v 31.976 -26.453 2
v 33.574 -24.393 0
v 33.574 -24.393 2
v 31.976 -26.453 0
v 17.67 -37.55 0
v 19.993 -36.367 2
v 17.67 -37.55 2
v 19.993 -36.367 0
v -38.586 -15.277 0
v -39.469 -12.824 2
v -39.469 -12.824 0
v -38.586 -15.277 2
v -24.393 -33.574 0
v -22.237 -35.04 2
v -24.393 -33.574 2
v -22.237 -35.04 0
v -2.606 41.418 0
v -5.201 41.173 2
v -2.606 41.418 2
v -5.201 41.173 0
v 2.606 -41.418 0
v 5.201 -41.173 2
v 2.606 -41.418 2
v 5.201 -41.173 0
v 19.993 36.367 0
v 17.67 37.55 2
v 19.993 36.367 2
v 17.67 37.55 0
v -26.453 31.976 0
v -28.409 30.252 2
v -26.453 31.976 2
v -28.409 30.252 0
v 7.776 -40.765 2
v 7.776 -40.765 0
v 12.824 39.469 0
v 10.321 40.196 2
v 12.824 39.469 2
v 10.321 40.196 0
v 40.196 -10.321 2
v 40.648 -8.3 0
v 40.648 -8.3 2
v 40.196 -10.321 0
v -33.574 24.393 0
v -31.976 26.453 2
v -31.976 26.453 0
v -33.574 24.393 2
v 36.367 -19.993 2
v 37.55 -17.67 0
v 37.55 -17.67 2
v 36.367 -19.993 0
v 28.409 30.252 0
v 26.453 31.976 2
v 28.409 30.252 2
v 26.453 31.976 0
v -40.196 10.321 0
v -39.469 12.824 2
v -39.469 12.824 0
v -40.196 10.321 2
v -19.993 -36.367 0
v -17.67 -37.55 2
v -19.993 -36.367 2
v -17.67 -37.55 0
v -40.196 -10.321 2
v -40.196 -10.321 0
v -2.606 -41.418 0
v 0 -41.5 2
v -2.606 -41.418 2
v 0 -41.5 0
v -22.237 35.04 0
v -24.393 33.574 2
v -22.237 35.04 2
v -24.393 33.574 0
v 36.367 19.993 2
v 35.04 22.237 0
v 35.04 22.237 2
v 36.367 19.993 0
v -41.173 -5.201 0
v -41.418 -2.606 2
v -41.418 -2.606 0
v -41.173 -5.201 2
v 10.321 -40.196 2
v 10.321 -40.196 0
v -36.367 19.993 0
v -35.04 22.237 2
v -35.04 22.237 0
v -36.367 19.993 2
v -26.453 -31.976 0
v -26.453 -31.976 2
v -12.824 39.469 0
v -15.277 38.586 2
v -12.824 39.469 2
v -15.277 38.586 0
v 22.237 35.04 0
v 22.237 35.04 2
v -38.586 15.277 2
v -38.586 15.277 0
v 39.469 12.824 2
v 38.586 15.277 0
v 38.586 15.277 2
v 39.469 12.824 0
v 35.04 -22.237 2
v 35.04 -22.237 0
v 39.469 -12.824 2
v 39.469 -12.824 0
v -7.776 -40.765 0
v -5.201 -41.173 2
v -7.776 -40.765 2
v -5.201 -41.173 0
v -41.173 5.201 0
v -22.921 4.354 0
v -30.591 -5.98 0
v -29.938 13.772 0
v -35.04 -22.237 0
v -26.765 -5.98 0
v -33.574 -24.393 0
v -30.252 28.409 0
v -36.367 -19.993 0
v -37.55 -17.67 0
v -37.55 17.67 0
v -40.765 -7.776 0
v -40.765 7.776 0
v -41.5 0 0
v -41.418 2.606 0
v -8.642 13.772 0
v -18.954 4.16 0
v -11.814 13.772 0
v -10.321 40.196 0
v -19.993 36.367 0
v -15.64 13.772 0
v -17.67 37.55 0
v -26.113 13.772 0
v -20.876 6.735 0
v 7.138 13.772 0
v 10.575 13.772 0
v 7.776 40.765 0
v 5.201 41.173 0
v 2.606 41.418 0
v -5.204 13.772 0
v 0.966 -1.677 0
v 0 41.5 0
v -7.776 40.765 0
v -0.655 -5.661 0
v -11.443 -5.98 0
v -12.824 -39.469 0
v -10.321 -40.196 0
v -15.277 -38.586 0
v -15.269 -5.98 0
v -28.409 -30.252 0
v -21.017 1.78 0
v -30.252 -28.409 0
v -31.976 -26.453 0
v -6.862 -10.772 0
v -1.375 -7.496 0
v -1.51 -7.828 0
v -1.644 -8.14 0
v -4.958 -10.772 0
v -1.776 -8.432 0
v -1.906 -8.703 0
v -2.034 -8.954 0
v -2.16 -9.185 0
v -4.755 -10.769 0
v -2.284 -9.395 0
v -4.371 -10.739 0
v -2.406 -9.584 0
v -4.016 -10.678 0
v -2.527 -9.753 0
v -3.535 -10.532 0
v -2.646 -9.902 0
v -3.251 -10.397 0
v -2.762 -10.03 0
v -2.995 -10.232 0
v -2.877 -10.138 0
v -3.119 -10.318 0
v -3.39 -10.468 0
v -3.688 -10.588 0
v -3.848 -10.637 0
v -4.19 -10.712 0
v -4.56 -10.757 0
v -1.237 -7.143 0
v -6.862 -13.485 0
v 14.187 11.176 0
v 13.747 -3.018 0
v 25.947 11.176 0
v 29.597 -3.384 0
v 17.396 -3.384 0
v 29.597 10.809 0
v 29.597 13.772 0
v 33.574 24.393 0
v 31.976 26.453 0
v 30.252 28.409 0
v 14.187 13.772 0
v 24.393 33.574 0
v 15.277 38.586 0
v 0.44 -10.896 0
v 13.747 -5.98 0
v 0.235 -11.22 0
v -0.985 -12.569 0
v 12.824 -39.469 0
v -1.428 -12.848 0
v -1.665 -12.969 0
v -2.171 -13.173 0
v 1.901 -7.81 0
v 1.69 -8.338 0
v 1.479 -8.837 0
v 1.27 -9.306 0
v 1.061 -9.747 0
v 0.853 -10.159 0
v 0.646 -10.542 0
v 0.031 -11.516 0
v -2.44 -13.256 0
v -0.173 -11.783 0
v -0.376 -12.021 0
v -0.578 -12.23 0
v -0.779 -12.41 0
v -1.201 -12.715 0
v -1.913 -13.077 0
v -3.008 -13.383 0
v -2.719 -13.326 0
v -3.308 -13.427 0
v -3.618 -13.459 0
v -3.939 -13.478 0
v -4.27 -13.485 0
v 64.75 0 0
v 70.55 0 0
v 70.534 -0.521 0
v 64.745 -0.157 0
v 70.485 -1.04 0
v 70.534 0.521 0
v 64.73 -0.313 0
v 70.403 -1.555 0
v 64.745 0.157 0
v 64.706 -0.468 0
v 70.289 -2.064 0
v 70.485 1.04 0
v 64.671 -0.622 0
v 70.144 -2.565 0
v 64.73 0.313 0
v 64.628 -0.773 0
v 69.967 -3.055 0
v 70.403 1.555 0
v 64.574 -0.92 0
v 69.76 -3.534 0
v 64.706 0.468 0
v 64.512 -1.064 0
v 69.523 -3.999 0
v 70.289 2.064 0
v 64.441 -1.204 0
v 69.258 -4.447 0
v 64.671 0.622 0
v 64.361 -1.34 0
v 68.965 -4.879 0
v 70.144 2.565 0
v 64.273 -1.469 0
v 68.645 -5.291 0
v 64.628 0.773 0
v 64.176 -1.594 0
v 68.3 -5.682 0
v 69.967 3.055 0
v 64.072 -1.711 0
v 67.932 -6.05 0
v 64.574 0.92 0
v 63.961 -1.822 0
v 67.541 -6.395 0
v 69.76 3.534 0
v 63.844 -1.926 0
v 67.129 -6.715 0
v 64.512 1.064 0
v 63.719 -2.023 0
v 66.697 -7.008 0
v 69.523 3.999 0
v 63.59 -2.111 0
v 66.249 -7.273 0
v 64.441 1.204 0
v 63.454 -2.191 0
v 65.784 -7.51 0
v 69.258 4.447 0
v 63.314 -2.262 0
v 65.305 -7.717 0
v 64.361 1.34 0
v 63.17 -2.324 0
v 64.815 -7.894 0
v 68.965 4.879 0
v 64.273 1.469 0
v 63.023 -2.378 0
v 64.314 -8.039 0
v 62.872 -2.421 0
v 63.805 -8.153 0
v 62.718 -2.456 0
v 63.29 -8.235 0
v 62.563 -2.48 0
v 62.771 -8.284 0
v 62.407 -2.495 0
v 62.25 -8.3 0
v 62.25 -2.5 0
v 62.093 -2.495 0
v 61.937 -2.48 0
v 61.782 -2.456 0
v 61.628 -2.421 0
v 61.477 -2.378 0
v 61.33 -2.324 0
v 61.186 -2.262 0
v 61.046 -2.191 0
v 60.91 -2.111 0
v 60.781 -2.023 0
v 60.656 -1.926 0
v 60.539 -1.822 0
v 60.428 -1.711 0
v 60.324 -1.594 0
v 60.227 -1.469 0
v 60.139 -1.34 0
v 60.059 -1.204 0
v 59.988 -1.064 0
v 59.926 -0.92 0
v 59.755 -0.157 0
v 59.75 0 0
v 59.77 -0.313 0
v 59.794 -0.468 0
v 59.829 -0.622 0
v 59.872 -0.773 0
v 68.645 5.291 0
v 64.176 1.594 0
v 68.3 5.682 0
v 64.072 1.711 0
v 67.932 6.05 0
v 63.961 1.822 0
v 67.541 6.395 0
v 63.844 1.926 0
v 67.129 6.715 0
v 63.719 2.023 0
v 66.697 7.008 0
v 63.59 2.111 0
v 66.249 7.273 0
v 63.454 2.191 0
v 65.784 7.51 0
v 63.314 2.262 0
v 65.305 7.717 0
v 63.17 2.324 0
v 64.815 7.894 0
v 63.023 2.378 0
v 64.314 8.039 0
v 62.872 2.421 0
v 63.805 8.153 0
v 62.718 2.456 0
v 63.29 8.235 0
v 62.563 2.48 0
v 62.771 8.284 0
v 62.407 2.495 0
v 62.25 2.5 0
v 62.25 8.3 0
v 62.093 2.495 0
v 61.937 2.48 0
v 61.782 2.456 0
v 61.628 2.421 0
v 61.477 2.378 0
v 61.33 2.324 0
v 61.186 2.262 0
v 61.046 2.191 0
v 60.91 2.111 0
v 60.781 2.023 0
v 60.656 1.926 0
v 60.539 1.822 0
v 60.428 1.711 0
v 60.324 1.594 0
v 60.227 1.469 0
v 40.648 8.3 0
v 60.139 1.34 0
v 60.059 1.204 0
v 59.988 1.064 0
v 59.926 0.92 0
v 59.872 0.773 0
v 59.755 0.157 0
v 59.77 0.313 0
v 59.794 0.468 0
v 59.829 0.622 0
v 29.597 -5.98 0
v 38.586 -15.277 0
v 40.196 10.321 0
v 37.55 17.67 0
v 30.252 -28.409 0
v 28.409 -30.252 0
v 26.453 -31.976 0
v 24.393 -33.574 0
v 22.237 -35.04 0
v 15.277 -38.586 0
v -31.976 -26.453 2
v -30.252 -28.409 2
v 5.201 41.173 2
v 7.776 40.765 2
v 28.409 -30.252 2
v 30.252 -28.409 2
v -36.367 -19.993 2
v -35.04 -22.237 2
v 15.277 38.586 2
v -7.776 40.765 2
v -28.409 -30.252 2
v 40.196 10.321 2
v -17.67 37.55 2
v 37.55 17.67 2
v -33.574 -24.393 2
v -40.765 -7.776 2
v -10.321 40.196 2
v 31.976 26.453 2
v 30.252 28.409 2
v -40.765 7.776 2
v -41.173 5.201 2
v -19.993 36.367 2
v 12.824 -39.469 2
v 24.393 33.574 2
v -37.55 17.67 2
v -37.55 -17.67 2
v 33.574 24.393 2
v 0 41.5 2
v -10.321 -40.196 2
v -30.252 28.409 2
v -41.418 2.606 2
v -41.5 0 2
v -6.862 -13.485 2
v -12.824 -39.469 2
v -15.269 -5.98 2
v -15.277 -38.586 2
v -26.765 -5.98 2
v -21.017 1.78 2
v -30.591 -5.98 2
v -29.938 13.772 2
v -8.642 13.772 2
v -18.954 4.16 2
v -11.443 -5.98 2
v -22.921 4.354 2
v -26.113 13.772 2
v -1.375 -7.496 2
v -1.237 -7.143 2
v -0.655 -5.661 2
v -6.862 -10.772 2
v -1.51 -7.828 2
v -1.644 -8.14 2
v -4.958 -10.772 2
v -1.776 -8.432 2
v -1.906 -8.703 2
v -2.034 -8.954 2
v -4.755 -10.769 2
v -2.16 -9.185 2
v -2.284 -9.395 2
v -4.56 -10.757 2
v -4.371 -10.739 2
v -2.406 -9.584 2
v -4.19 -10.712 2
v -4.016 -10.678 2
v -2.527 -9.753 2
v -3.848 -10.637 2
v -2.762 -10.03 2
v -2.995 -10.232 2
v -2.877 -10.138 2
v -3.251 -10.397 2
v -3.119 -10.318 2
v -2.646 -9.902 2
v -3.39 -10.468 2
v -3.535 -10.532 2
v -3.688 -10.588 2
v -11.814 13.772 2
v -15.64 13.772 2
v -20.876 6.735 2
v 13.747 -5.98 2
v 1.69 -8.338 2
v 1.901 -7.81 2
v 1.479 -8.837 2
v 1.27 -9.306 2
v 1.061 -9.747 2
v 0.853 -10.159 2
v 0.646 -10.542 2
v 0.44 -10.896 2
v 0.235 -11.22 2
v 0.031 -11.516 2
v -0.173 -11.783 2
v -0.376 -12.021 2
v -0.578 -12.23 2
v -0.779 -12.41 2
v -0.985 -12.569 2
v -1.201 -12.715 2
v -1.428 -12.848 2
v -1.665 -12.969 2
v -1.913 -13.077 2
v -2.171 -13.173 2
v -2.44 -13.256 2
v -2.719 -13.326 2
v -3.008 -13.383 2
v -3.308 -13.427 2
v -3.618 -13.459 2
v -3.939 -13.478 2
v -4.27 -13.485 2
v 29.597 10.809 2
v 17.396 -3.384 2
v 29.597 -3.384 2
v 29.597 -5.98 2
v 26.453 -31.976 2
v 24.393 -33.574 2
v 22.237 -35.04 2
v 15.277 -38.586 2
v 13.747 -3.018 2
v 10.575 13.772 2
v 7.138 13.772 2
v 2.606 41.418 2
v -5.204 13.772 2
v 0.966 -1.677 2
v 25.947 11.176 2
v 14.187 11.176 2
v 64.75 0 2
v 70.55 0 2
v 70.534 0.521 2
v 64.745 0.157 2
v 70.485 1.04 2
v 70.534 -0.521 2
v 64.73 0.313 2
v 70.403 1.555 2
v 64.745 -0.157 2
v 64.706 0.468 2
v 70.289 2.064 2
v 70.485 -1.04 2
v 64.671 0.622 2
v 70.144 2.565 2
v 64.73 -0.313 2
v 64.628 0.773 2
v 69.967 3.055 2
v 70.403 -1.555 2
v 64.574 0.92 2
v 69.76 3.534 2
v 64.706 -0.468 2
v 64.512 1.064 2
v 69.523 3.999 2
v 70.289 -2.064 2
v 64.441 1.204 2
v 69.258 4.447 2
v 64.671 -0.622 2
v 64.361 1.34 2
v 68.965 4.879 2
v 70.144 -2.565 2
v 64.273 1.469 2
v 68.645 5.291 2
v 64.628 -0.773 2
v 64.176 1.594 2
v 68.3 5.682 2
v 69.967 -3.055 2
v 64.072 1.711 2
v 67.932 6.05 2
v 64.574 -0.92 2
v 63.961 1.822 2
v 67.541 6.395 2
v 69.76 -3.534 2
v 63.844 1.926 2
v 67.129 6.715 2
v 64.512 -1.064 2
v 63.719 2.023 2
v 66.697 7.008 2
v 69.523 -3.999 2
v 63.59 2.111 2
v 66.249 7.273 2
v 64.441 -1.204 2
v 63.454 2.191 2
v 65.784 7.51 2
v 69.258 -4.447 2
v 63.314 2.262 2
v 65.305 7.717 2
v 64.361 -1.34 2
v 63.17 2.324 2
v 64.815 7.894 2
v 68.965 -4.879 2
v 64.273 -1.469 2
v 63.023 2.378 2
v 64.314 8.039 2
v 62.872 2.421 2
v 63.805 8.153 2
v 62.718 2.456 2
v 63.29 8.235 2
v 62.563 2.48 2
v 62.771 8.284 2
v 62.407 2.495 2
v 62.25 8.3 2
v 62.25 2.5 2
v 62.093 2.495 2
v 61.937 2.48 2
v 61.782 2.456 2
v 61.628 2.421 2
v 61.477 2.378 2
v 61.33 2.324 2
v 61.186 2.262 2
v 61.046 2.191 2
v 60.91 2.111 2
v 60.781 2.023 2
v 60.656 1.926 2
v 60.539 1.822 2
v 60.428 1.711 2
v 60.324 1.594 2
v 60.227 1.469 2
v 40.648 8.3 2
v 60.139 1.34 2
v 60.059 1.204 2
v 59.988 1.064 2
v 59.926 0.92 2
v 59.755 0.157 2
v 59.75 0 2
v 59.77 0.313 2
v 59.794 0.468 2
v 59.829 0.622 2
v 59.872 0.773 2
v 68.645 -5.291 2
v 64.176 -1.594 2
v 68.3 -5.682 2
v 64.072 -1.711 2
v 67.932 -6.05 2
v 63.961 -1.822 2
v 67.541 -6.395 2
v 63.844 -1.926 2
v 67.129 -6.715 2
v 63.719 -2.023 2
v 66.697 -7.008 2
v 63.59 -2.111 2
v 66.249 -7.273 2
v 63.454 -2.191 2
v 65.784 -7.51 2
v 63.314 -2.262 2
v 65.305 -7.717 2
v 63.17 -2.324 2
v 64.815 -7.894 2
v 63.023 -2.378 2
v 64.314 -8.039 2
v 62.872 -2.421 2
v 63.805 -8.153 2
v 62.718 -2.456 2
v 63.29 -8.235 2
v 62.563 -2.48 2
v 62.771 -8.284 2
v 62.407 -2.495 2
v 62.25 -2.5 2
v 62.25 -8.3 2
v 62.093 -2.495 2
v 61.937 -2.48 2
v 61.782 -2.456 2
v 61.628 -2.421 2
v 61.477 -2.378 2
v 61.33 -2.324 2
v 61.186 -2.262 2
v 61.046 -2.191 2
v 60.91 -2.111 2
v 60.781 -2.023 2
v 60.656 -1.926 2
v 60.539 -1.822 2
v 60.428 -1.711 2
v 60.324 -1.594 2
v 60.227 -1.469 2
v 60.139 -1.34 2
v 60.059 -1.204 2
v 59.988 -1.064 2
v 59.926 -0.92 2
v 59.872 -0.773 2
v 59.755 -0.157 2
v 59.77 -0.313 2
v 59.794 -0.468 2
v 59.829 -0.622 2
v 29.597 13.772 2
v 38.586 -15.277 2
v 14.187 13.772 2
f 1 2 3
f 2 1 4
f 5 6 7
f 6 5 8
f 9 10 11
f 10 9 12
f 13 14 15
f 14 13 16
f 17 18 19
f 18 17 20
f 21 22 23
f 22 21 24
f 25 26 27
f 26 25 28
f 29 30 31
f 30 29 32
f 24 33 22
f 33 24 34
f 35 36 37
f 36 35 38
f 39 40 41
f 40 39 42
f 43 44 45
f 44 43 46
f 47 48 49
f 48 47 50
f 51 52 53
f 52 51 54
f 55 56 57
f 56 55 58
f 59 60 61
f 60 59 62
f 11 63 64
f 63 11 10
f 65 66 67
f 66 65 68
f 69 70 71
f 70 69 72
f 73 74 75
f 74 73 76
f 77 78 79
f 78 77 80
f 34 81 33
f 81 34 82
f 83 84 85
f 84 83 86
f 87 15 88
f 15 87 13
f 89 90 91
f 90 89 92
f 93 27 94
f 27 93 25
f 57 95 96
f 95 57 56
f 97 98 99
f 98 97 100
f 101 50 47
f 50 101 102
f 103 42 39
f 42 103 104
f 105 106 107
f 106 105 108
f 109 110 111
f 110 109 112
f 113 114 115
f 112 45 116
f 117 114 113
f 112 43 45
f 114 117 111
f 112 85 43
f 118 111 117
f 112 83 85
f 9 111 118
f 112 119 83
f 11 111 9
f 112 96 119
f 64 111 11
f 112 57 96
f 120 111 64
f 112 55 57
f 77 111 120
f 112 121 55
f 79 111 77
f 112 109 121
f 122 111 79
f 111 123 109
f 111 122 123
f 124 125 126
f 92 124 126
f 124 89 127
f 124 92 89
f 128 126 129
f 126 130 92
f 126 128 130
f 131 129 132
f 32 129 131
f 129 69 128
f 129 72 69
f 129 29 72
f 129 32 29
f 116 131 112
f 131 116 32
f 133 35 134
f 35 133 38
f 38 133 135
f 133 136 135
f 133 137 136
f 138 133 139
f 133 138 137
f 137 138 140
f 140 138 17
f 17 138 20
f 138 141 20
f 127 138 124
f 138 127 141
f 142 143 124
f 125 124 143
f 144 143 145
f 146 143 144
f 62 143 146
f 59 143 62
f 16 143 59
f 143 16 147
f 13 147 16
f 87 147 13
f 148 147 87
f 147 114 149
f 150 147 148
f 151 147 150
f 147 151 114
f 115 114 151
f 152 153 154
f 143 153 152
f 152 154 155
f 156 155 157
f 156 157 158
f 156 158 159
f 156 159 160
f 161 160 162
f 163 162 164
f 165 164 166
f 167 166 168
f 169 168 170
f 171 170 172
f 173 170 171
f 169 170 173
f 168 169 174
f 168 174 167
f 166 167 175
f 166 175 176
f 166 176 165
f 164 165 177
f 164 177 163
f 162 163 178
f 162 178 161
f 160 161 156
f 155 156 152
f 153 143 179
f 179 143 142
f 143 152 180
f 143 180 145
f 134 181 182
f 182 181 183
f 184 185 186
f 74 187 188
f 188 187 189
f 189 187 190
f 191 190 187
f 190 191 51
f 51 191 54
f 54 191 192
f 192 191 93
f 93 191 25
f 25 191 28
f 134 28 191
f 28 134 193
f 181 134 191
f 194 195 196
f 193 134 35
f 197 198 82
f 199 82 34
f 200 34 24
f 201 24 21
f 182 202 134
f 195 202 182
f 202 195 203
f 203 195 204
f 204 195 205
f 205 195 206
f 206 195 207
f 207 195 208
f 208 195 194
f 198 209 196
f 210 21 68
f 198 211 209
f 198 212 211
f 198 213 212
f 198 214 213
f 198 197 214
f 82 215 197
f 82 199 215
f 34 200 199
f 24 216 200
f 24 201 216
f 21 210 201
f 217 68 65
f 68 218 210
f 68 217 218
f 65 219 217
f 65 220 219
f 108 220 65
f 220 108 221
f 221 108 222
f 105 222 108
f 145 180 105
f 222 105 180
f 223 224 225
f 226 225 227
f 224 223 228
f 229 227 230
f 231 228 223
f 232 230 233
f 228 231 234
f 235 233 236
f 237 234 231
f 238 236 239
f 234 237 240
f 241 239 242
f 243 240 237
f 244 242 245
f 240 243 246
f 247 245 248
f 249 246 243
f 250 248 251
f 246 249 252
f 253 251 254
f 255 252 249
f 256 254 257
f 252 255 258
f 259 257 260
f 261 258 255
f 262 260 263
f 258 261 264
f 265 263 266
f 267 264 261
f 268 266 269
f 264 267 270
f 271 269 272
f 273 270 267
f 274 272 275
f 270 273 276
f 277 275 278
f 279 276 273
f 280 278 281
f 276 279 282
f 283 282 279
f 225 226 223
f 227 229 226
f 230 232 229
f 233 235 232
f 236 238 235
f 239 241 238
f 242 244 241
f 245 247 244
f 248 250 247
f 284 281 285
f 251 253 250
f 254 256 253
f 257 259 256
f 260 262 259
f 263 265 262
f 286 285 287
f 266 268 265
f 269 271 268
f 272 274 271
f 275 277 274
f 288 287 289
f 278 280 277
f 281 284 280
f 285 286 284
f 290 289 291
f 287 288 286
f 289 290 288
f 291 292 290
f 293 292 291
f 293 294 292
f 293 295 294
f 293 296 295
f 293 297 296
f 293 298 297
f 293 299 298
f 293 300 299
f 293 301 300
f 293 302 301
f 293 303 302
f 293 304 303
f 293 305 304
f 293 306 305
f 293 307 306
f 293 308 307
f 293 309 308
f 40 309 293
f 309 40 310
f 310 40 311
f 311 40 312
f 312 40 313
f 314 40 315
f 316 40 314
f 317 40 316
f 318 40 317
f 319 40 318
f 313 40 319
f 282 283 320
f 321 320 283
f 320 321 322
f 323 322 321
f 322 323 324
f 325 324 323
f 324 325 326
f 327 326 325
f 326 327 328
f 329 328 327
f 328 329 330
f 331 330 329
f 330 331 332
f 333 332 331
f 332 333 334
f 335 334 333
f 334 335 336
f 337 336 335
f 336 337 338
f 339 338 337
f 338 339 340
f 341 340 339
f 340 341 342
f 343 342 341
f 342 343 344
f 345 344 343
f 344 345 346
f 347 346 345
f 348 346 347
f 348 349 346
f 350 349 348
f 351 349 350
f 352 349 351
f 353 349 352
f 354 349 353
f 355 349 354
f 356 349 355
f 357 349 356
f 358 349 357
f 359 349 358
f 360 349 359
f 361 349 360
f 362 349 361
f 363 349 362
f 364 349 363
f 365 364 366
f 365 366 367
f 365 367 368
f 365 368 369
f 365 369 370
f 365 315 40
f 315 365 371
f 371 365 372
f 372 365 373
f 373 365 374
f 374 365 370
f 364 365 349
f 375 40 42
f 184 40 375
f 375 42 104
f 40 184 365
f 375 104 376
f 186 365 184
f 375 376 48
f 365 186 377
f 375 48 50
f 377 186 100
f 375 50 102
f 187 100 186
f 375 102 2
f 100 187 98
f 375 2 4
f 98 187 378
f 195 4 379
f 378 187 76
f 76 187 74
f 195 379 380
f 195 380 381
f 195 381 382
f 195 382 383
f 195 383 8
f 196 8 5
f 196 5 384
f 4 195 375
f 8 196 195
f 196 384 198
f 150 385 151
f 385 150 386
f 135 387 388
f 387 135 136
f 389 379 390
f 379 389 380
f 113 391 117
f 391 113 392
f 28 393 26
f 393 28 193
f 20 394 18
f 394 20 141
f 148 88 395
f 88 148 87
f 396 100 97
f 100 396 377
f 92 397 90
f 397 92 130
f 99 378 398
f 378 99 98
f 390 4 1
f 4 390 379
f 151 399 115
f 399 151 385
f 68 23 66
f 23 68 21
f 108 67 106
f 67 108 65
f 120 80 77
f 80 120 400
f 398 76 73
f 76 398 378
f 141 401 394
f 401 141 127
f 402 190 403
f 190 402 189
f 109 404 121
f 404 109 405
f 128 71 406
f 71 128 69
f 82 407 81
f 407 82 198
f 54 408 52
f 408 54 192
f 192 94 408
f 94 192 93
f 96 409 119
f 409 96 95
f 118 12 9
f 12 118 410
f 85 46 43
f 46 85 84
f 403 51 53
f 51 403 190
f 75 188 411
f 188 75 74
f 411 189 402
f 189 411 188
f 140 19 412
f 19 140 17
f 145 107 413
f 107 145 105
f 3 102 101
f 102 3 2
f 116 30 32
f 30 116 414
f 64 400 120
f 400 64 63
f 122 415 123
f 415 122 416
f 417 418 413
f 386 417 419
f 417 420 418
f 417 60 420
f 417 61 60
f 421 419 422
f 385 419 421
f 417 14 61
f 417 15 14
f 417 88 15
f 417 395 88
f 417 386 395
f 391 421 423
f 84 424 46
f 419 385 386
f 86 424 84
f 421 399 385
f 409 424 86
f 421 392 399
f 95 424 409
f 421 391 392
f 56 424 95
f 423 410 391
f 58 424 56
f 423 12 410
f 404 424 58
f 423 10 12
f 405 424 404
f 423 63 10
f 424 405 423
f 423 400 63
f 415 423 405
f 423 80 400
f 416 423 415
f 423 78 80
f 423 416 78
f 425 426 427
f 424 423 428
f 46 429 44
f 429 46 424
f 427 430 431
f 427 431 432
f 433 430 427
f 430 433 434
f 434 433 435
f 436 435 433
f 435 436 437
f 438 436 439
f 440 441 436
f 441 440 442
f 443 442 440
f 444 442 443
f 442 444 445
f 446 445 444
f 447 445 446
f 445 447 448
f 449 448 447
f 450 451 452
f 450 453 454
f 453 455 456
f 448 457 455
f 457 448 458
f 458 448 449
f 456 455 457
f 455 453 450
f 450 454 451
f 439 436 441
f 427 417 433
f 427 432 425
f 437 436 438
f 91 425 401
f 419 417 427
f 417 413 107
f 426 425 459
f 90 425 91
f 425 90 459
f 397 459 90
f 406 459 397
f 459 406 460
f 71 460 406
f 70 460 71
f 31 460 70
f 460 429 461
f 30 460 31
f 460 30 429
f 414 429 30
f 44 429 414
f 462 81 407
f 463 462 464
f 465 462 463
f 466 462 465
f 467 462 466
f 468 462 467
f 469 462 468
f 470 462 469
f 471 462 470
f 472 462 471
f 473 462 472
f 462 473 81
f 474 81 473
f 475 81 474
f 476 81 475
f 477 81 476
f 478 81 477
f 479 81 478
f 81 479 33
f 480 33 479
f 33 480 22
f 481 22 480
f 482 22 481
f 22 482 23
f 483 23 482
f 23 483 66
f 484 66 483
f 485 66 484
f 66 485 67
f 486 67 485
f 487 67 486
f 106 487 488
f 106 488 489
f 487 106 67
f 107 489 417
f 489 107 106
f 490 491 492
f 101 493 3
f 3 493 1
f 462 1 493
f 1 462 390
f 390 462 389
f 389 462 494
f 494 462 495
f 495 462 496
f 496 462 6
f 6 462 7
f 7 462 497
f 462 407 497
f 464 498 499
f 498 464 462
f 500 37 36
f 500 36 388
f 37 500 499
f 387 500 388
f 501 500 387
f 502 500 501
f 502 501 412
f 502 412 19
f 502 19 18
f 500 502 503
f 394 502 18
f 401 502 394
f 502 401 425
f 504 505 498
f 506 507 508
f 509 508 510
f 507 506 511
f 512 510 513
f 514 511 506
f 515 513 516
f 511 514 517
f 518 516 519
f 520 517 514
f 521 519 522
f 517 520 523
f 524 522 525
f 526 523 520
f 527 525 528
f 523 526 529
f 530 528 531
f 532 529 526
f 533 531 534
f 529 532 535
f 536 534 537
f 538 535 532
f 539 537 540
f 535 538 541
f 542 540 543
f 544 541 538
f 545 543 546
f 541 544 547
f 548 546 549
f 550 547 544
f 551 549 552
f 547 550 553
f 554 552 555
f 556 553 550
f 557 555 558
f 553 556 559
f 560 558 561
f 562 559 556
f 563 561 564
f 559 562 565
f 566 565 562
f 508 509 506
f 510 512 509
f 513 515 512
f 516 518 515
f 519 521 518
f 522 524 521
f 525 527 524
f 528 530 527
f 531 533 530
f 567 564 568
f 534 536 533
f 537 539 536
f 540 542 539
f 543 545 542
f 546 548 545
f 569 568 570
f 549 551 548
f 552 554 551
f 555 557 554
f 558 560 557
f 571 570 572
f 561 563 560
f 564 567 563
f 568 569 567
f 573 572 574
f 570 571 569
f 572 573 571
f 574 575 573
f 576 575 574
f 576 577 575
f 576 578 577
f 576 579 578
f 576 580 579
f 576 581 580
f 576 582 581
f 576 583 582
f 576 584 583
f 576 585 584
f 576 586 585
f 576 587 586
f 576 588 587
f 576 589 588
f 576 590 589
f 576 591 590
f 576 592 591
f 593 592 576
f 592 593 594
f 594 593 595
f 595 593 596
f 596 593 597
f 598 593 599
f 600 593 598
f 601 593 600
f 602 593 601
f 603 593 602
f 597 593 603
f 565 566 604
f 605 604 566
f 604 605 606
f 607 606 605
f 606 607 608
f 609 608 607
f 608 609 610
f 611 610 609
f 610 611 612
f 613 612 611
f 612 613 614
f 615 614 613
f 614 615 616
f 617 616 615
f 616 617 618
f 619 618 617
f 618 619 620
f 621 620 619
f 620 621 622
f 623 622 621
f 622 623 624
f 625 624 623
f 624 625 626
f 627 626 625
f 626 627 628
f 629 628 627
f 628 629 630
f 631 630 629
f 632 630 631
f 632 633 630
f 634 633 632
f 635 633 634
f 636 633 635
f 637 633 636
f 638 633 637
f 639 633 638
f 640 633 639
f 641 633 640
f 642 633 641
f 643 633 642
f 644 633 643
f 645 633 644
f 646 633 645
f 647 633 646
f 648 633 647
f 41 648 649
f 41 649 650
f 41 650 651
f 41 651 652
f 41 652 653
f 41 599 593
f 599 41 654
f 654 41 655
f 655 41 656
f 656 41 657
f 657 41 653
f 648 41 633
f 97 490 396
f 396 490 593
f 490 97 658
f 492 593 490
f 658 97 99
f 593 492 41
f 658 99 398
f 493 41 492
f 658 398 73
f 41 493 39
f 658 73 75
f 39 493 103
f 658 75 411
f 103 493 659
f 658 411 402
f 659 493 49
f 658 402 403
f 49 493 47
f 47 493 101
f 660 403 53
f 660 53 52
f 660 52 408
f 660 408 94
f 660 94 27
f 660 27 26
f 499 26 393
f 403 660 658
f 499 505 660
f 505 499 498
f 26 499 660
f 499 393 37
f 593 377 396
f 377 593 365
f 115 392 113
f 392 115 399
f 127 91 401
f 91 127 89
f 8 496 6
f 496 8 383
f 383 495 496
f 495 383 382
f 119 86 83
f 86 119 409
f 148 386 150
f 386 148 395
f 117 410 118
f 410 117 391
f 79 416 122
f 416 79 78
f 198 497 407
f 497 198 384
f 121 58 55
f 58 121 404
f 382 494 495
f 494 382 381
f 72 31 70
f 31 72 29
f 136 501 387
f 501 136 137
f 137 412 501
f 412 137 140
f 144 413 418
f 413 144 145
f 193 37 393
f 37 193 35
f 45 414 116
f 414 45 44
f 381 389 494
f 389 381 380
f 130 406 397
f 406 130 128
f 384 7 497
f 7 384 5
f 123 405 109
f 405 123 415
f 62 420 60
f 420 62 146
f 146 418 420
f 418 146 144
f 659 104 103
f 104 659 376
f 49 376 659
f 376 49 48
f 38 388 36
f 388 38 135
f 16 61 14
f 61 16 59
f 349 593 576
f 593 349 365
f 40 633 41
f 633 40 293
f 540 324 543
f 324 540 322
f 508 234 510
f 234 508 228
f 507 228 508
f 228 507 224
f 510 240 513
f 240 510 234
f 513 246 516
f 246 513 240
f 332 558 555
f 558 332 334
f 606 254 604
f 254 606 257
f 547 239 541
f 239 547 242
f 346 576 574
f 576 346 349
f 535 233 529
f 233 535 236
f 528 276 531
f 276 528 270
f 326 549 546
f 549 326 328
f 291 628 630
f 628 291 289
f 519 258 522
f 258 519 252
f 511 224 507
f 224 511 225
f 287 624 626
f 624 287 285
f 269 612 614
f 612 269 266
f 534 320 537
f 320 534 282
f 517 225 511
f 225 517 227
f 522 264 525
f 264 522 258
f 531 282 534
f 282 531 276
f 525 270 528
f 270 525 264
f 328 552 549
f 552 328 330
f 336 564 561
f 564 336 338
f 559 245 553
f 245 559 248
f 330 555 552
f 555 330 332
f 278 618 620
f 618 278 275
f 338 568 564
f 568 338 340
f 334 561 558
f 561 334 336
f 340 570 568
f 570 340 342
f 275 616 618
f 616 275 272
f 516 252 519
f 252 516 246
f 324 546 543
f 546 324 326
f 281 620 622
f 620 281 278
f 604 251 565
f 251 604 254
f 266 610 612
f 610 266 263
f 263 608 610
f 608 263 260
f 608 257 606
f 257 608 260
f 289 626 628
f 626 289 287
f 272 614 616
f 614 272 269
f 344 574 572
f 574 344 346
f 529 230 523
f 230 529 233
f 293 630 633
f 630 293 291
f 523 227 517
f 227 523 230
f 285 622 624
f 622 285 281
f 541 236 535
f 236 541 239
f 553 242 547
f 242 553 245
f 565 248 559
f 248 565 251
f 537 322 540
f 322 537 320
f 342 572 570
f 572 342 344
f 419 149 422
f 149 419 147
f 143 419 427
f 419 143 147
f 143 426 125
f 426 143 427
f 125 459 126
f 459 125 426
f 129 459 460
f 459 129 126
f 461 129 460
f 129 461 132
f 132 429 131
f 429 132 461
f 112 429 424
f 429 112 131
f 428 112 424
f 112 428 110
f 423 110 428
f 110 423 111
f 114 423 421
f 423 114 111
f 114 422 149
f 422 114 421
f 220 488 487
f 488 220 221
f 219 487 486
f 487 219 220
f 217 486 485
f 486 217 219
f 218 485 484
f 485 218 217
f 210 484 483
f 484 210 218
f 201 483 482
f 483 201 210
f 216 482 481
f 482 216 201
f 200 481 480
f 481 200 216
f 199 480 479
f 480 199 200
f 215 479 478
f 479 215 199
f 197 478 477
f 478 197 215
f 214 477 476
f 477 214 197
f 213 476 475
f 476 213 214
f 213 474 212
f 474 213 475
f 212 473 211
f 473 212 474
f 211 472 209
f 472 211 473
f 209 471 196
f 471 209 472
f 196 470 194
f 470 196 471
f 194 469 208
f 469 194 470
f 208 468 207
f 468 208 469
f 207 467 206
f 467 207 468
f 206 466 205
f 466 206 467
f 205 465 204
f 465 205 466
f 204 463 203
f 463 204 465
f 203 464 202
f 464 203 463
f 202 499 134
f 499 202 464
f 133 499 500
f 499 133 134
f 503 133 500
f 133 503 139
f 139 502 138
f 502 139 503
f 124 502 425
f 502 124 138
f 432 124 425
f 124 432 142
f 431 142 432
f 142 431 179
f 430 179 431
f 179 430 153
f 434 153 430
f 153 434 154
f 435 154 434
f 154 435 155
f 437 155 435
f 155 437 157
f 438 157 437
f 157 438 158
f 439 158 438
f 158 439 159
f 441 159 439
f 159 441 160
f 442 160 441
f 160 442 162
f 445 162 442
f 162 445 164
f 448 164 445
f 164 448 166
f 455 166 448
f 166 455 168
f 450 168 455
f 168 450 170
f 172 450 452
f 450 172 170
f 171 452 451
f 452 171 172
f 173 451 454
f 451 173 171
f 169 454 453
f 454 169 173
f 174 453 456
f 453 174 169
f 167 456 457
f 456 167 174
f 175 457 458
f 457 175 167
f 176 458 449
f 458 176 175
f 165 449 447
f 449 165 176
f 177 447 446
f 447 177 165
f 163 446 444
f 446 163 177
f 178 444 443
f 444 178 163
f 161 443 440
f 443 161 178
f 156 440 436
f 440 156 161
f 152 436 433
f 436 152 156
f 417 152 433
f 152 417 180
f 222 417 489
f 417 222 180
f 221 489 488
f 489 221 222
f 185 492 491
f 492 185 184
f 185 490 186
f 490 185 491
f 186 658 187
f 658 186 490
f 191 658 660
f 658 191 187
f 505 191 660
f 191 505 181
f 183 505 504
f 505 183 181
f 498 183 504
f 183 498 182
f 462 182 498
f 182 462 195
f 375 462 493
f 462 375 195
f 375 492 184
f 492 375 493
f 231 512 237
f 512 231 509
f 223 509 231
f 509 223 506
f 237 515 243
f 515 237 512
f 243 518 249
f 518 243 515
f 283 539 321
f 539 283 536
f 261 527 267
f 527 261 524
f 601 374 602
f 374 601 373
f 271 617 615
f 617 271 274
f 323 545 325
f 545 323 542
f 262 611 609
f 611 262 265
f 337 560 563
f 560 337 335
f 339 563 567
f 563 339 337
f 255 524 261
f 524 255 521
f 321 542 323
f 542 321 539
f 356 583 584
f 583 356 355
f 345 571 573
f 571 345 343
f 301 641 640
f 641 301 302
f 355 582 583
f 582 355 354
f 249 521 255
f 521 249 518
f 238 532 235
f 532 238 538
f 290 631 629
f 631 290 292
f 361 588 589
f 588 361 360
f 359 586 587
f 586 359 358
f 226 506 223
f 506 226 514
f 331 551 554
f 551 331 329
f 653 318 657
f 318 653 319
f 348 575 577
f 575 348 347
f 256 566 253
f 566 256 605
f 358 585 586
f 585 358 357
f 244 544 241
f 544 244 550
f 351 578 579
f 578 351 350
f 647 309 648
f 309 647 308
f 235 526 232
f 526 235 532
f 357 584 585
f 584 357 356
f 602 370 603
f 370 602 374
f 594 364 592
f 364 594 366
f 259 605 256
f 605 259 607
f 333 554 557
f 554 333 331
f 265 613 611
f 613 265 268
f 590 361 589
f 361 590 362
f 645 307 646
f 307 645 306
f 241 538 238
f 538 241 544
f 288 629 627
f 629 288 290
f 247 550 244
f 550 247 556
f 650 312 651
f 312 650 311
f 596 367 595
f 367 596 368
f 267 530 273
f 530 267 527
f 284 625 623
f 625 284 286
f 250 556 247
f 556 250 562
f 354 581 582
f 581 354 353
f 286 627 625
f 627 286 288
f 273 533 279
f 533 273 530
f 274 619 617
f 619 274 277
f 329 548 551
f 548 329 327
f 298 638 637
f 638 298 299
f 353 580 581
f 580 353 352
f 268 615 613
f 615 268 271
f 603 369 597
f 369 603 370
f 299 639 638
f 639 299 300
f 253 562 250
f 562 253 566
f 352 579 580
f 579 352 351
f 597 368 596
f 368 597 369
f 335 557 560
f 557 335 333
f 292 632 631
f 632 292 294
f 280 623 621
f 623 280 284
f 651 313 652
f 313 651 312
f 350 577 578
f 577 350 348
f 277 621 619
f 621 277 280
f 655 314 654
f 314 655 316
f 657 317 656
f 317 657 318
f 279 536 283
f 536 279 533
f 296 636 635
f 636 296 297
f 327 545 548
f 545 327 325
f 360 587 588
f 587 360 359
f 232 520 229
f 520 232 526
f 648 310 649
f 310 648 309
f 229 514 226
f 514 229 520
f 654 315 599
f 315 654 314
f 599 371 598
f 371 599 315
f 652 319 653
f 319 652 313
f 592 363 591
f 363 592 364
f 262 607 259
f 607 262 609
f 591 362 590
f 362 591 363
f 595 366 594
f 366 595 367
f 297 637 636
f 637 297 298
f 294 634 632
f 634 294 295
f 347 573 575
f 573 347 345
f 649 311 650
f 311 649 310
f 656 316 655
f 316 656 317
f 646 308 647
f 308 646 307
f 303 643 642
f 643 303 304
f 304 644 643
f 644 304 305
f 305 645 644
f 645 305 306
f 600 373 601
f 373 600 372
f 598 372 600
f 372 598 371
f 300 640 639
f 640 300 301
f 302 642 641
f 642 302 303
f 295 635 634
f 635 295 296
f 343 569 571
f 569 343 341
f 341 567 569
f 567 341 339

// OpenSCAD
// Font
Text = "xyz"; 

Font = "Allerta Stencil"; // [Allerta Stencil, Stardos Stencil, Sirin Stencil, Emblema One, Keania One, Passero One, Baumans, Expletus Sans, Plaster, Wallpoet, Codystar, Megrim]

// Spacing between characters
Spacing = 1.05; //[0.8, 0.85, 0.9, 0.95, 1, 1.05, 1.1, 1.15, 1.2]

// Font size
Size = 26; // [6:48]

// Stencil height
Height = 2; //[1,2,3]

// Stencil diameter (62 -- small cup, 83 -- mug)
Dia = 83; //[62,83]

module stencil() {
    union() {
        cylinder(d=Dia, h=Height, $fn=100);
        translate([Dia*0.5,0,Height/2]) cube([Dia*0.5, Dia*0.2, Height], center=true);
        translate([Dia*0.75,0,0]) cylinder(d=Dia*0.2, h=Height, $fn=100);
    }
}

difference() {

stencil();
    translate([0, 0, -1]) linear_extrude(height=Height+2) {
        text(size=Size, text=Text, font=Font, halign = "center", valign="center", spacing=Spacing, $fn=100);
    }
    translate([Dia*0.75,0,0]) cylinder(d=5, h=Height, $fn=100);
}
